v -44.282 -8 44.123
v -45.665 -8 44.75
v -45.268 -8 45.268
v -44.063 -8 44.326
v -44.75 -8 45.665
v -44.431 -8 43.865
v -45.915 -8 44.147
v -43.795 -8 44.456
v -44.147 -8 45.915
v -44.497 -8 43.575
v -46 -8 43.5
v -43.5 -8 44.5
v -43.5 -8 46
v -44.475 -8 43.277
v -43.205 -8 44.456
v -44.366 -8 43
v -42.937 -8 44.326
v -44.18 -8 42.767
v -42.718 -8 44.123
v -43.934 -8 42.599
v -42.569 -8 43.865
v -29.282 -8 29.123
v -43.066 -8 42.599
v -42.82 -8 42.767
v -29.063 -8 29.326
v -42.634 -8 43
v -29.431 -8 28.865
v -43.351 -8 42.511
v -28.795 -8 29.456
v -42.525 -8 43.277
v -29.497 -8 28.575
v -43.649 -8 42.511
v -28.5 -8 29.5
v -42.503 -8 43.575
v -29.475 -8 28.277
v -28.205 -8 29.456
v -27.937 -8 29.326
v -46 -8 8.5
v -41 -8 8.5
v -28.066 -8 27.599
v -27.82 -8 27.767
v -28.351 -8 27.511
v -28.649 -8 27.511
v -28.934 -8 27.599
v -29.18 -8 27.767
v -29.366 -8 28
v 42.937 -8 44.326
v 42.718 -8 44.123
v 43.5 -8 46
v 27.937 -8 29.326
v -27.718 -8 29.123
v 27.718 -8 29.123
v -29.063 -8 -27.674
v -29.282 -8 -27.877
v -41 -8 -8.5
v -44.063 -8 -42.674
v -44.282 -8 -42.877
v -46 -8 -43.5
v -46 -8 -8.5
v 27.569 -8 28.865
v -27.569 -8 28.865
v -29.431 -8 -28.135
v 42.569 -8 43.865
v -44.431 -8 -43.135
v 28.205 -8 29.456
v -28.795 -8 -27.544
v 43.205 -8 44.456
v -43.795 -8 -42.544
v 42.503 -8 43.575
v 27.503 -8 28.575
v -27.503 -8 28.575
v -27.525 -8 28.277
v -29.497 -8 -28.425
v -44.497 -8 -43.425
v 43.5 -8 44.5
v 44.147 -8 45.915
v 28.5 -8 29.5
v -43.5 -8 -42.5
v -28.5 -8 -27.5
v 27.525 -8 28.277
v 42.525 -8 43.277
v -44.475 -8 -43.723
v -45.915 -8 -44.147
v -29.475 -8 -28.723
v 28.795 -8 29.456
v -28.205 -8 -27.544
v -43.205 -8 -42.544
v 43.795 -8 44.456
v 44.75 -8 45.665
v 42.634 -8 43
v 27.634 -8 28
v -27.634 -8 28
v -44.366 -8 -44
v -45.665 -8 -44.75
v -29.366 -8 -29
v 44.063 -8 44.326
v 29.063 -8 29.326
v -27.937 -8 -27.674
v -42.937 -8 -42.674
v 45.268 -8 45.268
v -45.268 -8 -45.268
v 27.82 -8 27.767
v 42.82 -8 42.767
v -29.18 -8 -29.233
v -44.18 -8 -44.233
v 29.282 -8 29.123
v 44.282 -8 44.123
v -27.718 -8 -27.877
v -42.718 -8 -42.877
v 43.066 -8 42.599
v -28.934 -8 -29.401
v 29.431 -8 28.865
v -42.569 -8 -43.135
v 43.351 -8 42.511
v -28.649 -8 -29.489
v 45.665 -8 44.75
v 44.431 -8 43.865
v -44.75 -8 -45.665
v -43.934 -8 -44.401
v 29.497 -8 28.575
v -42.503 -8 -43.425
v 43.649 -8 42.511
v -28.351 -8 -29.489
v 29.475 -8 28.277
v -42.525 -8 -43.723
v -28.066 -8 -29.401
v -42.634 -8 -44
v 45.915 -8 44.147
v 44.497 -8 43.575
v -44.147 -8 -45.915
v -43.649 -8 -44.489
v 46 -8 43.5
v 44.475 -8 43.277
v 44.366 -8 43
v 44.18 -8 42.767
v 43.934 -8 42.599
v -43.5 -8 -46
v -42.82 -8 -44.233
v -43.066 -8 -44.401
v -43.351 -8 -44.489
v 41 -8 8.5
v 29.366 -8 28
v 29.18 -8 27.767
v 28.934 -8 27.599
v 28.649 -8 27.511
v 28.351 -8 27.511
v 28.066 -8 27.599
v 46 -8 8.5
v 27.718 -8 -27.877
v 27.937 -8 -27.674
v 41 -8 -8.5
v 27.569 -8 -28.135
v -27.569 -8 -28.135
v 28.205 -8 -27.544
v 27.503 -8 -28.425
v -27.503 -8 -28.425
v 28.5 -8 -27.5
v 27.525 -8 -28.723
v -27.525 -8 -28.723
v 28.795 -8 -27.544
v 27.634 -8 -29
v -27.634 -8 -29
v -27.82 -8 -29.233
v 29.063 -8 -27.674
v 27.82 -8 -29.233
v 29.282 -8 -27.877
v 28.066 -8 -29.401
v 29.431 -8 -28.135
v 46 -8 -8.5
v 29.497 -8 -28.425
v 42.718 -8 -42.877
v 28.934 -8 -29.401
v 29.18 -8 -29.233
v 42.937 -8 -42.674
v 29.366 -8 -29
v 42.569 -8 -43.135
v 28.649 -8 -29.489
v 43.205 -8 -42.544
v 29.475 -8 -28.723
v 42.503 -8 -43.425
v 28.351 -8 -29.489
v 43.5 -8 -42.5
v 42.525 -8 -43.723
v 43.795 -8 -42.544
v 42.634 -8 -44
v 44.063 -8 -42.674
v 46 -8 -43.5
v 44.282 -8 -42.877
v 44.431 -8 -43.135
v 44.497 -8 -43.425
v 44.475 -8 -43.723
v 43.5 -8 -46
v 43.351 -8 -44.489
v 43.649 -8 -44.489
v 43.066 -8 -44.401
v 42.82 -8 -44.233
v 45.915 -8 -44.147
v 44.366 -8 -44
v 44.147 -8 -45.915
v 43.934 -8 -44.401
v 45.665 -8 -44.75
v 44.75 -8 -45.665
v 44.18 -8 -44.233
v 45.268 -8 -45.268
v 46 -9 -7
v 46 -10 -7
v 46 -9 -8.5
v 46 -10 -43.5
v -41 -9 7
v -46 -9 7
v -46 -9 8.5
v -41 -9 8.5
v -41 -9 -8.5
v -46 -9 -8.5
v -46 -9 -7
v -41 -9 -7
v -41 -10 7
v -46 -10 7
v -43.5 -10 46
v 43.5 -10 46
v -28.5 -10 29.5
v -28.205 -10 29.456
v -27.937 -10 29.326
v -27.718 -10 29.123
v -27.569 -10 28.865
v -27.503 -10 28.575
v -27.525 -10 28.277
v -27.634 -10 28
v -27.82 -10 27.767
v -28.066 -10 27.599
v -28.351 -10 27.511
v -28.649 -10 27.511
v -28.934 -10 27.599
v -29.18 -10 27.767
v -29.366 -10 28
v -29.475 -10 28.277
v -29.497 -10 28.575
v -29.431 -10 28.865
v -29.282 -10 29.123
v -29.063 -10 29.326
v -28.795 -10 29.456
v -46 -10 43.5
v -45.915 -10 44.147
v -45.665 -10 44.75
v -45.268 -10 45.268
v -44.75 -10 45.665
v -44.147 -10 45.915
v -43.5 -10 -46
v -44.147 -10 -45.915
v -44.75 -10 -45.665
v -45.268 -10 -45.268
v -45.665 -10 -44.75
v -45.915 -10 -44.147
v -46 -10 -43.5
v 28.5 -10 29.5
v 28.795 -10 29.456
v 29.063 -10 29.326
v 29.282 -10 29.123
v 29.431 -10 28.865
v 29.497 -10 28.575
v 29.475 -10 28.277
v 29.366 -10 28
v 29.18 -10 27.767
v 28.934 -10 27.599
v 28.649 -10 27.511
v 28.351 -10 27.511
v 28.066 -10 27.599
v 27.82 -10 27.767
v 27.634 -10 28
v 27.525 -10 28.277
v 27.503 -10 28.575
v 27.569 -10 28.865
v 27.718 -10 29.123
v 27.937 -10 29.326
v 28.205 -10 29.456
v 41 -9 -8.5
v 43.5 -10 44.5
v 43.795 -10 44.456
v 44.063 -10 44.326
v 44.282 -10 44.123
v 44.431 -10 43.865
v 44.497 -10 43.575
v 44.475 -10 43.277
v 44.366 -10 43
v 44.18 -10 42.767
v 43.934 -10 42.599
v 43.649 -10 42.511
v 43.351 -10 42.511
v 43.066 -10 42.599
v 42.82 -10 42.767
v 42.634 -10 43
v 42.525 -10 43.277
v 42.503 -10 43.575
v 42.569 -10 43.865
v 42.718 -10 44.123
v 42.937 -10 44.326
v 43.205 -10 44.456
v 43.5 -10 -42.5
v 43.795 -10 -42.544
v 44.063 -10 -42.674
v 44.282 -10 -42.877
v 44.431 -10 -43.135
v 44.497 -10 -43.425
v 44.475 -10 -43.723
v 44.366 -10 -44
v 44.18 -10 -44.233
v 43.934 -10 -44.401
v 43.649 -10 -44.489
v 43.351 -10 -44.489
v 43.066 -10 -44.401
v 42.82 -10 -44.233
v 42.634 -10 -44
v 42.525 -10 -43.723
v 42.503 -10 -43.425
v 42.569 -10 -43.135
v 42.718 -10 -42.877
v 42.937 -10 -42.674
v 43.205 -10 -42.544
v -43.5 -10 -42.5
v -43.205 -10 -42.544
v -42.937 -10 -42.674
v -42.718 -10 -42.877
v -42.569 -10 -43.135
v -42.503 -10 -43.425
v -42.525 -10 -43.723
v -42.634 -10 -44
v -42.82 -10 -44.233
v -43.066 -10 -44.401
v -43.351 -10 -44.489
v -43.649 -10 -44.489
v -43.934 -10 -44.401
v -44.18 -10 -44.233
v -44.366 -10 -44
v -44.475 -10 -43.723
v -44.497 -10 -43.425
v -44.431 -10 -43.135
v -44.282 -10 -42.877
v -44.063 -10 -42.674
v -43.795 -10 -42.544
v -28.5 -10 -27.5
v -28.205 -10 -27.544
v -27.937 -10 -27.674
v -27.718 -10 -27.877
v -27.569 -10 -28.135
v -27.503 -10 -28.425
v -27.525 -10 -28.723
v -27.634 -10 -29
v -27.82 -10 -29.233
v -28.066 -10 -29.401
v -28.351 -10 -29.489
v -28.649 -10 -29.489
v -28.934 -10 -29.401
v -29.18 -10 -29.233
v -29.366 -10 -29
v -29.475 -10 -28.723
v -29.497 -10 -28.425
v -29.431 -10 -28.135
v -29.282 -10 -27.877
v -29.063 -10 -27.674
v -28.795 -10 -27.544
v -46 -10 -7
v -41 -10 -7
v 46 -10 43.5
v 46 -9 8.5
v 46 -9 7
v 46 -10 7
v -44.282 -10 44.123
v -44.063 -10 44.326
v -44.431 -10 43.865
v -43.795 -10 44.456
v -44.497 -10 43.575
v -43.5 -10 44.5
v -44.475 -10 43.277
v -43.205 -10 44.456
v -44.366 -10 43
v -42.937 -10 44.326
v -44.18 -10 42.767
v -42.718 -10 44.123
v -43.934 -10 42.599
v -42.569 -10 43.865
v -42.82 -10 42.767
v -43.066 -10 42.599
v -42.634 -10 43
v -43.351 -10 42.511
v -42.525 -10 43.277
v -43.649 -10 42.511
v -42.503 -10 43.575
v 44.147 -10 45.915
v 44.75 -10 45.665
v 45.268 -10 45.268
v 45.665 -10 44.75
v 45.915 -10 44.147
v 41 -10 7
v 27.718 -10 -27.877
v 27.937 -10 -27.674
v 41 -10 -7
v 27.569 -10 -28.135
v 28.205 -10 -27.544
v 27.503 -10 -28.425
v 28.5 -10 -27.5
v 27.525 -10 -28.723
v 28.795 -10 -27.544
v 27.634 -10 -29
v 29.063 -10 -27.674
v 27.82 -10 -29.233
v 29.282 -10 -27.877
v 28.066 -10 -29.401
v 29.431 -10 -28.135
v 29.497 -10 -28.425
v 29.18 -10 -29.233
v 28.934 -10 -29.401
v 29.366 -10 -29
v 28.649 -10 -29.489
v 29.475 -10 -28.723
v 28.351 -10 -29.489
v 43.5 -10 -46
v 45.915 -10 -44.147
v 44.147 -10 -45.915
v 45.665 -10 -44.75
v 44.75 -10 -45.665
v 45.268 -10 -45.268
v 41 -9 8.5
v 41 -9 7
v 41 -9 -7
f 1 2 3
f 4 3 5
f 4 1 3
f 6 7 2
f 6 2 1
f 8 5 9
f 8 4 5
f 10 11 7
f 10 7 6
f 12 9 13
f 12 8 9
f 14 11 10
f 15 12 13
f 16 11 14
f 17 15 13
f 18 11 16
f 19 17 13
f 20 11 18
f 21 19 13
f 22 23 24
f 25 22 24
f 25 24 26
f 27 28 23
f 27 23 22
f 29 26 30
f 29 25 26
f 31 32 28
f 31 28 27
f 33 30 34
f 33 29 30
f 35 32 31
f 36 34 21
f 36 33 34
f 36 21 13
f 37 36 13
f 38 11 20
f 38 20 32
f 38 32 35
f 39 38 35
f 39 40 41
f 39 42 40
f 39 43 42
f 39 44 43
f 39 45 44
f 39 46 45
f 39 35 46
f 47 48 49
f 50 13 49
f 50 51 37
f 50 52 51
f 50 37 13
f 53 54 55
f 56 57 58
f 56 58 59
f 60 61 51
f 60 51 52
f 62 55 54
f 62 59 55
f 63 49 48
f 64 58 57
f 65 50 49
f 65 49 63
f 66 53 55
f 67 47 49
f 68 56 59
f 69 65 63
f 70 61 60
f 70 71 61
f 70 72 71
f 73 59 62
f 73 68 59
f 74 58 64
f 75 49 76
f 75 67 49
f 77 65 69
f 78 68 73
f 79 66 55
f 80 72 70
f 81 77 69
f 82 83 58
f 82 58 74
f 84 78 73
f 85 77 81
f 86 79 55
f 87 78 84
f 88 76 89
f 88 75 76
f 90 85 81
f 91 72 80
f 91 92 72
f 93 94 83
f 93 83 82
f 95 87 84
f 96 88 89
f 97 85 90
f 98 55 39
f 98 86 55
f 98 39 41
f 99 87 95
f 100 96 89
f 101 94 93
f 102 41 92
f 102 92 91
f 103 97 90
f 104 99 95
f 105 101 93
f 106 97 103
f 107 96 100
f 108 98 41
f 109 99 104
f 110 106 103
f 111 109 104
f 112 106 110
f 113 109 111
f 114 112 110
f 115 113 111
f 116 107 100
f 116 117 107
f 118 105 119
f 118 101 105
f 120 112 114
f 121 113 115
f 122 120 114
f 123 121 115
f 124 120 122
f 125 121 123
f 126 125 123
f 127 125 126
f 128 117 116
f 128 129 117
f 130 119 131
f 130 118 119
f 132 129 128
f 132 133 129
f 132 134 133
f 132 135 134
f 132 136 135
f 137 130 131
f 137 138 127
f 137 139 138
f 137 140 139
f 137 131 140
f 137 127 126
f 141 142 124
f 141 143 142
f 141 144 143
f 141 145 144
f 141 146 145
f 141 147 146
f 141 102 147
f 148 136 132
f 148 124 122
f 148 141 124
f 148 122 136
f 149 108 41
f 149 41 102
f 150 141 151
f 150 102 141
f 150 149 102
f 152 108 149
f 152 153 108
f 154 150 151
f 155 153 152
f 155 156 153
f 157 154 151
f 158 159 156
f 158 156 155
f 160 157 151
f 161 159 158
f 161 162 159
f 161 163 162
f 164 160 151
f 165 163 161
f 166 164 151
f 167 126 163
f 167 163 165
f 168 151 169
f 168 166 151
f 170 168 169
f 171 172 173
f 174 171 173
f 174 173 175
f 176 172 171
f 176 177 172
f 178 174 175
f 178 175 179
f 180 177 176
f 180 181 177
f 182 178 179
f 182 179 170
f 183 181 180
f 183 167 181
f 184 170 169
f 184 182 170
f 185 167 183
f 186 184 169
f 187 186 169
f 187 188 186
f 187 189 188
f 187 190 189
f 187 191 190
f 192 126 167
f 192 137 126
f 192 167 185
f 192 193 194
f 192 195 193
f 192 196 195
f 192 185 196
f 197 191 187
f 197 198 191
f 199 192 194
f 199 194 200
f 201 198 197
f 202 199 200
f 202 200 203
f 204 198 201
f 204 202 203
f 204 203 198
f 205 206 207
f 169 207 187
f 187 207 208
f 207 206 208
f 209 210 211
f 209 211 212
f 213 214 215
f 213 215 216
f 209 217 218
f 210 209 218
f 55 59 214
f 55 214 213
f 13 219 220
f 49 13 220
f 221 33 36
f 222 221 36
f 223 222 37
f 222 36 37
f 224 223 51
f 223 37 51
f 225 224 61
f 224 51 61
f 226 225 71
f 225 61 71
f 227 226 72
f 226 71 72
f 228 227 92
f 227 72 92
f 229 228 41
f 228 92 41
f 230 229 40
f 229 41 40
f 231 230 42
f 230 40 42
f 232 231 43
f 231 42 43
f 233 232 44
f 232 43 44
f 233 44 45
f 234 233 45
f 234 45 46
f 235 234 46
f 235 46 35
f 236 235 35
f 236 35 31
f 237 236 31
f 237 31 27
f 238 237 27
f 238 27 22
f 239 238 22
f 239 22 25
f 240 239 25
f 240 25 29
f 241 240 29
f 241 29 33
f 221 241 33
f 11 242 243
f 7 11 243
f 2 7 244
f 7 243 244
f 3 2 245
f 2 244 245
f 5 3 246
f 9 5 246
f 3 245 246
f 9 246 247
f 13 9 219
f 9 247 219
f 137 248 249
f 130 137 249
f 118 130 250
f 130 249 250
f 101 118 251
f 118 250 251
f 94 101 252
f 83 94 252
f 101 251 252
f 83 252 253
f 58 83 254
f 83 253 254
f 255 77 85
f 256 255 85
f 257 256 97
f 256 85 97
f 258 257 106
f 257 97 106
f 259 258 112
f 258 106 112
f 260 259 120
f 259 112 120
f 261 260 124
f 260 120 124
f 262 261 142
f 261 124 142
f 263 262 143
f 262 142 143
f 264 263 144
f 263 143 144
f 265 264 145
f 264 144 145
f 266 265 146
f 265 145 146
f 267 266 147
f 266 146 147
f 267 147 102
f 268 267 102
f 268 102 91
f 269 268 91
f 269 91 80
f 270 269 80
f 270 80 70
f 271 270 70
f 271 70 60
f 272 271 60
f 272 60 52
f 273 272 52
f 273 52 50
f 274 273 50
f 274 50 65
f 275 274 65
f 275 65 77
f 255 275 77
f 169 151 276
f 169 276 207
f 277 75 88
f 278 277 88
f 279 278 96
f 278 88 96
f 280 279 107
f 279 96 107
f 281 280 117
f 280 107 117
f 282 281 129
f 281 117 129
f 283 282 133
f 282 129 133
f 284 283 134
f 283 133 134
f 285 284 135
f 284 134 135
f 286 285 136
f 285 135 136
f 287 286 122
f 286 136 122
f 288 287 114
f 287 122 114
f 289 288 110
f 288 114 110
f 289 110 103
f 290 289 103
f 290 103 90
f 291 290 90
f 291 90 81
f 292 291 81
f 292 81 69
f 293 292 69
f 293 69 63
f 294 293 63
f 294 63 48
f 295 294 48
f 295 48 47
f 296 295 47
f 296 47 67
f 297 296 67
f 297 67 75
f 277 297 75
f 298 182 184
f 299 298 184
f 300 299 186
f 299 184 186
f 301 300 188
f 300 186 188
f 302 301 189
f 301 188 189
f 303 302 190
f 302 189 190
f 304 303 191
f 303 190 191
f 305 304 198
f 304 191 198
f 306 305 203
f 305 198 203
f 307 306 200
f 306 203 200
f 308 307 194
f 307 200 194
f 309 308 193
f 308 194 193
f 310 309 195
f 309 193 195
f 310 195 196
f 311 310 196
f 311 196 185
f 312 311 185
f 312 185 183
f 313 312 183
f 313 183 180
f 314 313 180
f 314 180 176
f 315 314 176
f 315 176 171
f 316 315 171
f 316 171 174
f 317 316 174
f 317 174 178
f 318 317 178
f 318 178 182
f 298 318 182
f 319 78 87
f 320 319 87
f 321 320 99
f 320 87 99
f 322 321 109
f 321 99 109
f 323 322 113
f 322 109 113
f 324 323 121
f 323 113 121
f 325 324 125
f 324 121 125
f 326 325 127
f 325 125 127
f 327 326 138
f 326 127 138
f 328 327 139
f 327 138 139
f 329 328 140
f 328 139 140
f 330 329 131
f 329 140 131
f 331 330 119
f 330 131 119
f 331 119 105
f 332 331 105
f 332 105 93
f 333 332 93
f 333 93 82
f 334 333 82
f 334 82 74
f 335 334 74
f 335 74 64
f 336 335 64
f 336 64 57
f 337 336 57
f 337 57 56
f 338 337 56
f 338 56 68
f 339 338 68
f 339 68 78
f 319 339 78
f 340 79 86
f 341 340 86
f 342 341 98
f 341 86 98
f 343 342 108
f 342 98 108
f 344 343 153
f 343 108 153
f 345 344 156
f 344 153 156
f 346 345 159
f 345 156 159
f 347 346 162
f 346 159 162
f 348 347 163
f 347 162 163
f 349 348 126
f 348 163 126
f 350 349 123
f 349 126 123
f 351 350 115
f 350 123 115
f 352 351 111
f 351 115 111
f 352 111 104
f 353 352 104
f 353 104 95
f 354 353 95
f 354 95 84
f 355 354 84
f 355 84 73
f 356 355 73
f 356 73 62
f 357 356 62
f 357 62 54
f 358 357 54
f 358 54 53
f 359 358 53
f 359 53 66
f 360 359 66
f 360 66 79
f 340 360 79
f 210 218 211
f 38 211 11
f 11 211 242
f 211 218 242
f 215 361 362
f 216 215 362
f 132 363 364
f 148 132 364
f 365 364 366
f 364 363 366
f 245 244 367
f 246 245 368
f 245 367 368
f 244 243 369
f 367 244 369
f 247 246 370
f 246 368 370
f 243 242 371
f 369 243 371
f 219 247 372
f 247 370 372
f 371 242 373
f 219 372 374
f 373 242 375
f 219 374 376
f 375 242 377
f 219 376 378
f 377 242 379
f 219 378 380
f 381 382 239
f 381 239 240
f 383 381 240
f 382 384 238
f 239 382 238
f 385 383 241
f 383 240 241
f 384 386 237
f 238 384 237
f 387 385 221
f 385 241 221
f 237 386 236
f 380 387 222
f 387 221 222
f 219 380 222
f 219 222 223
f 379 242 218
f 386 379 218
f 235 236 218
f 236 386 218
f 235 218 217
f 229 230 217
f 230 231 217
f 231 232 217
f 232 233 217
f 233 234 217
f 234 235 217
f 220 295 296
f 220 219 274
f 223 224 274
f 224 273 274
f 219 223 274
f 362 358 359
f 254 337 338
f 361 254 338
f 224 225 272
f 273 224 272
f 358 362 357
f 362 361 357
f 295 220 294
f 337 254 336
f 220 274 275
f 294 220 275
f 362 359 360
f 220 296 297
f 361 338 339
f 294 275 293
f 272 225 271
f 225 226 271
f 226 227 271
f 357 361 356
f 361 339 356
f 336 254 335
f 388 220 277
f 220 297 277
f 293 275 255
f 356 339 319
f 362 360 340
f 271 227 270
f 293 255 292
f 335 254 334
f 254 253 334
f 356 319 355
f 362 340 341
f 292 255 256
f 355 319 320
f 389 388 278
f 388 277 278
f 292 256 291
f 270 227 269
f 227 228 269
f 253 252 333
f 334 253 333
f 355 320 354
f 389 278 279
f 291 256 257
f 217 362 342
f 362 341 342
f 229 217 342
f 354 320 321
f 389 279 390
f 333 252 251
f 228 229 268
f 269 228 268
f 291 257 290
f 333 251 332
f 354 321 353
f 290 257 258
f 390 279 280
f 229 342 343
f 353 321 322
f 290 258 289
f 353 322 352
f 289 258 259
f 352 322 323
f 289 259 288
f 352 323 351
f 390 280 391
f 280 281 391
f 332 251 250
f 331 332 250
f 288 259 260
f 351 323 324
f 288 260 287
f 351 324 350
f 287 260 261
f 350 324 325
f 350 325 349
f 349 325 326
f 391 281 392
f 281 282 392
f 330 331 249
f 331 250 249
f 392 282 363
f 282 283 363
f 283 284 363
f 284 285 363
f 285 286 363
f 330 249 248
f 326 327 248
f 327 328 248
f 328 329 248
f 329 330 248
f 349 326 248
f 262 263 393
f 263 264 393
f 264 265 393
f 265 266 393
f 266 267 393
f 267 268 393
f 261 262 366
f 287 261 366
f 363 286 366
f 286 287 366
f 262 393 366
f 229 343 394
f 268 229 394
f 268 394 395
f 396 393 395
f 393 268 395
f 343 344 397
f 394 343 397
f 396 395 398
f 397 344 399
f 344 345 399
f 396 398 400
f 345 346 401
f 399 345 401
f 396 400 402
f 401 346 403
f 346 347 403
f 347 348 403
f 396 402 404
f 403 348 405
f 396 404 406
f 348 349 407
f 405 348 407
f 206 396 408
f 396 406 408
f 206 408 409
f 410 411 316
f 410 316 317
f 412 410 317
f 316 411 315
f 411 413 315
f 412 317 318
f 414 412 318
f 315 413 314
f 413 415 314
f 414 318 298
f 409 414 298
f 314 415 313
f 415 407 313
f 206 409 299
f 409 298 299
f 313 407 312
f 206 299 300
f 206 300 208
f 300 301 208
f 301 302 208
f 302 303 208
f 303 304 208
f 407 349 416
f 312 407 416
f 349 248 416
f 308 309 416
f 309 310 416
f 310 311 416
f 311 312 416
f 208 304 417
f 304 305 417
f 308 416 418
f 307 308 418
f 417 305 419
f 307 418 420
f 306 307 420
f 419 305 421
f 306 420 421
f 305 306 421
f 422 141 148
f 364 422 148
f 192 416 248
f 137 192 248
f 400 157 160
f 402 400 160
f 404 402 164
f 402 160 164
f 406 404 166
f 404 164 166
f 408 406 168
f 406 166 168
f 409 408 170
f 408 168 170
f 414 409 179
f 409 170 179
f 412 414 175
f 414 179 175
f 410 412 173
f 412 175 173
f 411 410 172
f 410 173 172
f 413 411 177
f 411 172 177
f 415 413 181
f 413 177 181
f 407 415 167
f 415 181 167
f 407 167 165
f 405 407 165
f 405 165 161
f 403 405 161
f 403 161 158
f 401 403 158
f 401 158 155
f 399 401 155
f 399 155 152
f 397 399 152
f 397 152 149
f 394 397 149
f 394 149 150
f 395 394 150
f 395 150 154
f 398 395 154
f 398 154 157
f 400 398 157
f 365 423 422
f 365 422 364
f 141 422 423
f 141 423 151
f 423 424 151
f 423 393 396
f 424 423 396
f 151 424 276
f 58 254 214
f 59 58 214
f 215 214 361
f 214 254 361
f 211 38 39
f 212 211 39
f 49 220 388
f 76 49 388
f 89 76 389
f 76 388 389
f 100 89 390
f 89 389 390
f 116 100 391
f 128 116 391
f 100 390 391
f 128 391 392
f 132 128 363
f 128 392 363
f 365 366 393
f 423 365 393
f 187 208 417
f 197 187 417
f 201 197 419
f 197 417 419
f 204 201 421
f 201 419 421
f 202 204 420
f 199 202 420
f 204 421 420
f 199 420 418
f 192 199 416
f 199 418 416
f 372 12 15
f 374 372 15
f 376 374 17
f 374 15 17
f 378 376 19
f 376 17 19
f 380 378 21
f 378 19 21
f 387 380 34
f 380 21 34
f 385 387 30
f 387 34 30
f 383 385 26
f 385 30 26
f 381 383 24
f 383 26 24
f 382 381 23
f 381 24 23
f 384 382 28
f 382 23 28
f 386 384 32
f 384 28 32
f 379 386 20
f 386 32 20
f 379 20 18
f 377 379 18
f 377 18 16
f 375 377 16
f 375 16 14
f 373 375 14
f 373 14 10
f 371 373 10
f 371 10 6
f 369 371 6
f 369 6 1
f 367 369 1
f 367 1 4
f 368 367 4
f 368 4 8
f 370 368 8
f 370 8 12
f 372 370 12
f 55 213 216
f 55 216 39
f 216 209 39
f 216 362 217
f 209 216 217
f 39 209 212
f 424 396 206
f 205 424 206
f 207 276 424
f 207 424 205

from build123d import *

# Parameters (mm, degrees)
BOSS_EXTRUDE1_DEPTH = 2
SKETCH7_W           = 5
SKETCH7_H           = 1.5
CUT_EXTRUDE1_DEPTH  = 1
SKETCH8_R           = 1
CUT_EXTRUDE2_DEPTH  = 5


with BuildPart() as part:
    # Sketch6 → Boss-Extrude1 (new body)
    with BuildSketch(Plane(origin=(0, -10, 0), x_dir=(1, 0, 0), z_dir=(0, 1, 0))):
        with BuildLine():
            Line((-46, -7), (-46, -43.5))
            ThreePointArc((-46, -43.5), (-45.267766953, -45.267766953), (-43.5, -46))
            Line((-43.5, -46), (43.5, -46))
            ThreePointArc((43.5, -46), (45.267766953, -45.267766953), (46, -43.5))
            Line((46, -43.5), (46, -7))
            Line((46, -7), (41, -7))
            Line((41, -7), (41, 7))
            Line((41, 7), (46, 7))
            Line((46, 7), (46, 43.5))
            ThreePointArc((46, 43.5), (45.267766953, 45.267766953), (43.5, 46))
            Line((43.5, 46), (-43.5, 46))
            ThreePointArc((-43.5, 46), (-45.267766953, 45.267766953), (-46, 43.5))
            Line((-46, 43.5), (-46, 7))
            Line((-46, 7), (-41, 7))
            Line((-41, 7), (-41, -7))
            Line((-41, -7), (-46, -7))
        make_face()
    extrude(amount=BOSS_EXTRUDE1_DEPTH)

    # Sketch7 → Cut-Extrude1 (cut)
    with BuildSketch(Plane(origin=(0, -8, 0), x_dir=(1, 0, 0), z_dir=(0, 1, 0))):
        with Locations((-43.5, 7.75)):
            Rectangle(SKETCH7_W, SKETCH7_H)
        with Locations((-43.5, -7.75)):
            Rectangle(SKETCH7_W, SKETCH7_H)
        with Locations((43.5, -7.75)):
            Rectangle(SKETCH7_W, SKETCH7_H)
        with Locations((43.5, 7.75)):
            Rectangle(SKETCH7_W, SKETCH7_H)
    extrude(amount=-CUT_EXTRUDE1_DEPTH, mode=Mode.SUBTRACT)

    # Sketch8 → Cut-Extrude2 (cut)
    with BuildSketch(Plane(origin=(0, -8, 0), x_dir=(1, 0, 0), z_dir=(0, 1, 0))):
        with Locations(Location((-43.5, 43.5, 0), (0, 0, 270))):
            Circle(SKETCH8_R)
        with Locations(Location((43.5, 43.5, 0), (0, 0, 270))):
            Circle(SKETCH8_R)
        with Locations(Location((-43.5, -43.5, 0), (0, 0, 270))):
            Circle(SKETCH8_R)
        with Locations(Location((43.5, -43.5, 0), (0, 0, 270))):
            Circle(SKETCH8_R)
        with Locations(Location((-28.5, 28.5, 0), (0, 0, 270))):
            Circle(SKETCH8_R)
        with Locations(Location((28.5, 28.5, 0), (0, 0, 270))):
            Circle(SKETCH8_R)
        with Locations(Location((-28.5, -28.5, 0), (0, 0, 270))):
            Circle(SKETCH8_R)
        with Locations(Location((28.5, -28.5, 0), (0, 0, 270))):
            Circle(SKETCH8_R)
    extrude(amount=-CUT_EXTRUDE2_DEPTH, mode=Mode.SUBTRACT)


solid = part.part
